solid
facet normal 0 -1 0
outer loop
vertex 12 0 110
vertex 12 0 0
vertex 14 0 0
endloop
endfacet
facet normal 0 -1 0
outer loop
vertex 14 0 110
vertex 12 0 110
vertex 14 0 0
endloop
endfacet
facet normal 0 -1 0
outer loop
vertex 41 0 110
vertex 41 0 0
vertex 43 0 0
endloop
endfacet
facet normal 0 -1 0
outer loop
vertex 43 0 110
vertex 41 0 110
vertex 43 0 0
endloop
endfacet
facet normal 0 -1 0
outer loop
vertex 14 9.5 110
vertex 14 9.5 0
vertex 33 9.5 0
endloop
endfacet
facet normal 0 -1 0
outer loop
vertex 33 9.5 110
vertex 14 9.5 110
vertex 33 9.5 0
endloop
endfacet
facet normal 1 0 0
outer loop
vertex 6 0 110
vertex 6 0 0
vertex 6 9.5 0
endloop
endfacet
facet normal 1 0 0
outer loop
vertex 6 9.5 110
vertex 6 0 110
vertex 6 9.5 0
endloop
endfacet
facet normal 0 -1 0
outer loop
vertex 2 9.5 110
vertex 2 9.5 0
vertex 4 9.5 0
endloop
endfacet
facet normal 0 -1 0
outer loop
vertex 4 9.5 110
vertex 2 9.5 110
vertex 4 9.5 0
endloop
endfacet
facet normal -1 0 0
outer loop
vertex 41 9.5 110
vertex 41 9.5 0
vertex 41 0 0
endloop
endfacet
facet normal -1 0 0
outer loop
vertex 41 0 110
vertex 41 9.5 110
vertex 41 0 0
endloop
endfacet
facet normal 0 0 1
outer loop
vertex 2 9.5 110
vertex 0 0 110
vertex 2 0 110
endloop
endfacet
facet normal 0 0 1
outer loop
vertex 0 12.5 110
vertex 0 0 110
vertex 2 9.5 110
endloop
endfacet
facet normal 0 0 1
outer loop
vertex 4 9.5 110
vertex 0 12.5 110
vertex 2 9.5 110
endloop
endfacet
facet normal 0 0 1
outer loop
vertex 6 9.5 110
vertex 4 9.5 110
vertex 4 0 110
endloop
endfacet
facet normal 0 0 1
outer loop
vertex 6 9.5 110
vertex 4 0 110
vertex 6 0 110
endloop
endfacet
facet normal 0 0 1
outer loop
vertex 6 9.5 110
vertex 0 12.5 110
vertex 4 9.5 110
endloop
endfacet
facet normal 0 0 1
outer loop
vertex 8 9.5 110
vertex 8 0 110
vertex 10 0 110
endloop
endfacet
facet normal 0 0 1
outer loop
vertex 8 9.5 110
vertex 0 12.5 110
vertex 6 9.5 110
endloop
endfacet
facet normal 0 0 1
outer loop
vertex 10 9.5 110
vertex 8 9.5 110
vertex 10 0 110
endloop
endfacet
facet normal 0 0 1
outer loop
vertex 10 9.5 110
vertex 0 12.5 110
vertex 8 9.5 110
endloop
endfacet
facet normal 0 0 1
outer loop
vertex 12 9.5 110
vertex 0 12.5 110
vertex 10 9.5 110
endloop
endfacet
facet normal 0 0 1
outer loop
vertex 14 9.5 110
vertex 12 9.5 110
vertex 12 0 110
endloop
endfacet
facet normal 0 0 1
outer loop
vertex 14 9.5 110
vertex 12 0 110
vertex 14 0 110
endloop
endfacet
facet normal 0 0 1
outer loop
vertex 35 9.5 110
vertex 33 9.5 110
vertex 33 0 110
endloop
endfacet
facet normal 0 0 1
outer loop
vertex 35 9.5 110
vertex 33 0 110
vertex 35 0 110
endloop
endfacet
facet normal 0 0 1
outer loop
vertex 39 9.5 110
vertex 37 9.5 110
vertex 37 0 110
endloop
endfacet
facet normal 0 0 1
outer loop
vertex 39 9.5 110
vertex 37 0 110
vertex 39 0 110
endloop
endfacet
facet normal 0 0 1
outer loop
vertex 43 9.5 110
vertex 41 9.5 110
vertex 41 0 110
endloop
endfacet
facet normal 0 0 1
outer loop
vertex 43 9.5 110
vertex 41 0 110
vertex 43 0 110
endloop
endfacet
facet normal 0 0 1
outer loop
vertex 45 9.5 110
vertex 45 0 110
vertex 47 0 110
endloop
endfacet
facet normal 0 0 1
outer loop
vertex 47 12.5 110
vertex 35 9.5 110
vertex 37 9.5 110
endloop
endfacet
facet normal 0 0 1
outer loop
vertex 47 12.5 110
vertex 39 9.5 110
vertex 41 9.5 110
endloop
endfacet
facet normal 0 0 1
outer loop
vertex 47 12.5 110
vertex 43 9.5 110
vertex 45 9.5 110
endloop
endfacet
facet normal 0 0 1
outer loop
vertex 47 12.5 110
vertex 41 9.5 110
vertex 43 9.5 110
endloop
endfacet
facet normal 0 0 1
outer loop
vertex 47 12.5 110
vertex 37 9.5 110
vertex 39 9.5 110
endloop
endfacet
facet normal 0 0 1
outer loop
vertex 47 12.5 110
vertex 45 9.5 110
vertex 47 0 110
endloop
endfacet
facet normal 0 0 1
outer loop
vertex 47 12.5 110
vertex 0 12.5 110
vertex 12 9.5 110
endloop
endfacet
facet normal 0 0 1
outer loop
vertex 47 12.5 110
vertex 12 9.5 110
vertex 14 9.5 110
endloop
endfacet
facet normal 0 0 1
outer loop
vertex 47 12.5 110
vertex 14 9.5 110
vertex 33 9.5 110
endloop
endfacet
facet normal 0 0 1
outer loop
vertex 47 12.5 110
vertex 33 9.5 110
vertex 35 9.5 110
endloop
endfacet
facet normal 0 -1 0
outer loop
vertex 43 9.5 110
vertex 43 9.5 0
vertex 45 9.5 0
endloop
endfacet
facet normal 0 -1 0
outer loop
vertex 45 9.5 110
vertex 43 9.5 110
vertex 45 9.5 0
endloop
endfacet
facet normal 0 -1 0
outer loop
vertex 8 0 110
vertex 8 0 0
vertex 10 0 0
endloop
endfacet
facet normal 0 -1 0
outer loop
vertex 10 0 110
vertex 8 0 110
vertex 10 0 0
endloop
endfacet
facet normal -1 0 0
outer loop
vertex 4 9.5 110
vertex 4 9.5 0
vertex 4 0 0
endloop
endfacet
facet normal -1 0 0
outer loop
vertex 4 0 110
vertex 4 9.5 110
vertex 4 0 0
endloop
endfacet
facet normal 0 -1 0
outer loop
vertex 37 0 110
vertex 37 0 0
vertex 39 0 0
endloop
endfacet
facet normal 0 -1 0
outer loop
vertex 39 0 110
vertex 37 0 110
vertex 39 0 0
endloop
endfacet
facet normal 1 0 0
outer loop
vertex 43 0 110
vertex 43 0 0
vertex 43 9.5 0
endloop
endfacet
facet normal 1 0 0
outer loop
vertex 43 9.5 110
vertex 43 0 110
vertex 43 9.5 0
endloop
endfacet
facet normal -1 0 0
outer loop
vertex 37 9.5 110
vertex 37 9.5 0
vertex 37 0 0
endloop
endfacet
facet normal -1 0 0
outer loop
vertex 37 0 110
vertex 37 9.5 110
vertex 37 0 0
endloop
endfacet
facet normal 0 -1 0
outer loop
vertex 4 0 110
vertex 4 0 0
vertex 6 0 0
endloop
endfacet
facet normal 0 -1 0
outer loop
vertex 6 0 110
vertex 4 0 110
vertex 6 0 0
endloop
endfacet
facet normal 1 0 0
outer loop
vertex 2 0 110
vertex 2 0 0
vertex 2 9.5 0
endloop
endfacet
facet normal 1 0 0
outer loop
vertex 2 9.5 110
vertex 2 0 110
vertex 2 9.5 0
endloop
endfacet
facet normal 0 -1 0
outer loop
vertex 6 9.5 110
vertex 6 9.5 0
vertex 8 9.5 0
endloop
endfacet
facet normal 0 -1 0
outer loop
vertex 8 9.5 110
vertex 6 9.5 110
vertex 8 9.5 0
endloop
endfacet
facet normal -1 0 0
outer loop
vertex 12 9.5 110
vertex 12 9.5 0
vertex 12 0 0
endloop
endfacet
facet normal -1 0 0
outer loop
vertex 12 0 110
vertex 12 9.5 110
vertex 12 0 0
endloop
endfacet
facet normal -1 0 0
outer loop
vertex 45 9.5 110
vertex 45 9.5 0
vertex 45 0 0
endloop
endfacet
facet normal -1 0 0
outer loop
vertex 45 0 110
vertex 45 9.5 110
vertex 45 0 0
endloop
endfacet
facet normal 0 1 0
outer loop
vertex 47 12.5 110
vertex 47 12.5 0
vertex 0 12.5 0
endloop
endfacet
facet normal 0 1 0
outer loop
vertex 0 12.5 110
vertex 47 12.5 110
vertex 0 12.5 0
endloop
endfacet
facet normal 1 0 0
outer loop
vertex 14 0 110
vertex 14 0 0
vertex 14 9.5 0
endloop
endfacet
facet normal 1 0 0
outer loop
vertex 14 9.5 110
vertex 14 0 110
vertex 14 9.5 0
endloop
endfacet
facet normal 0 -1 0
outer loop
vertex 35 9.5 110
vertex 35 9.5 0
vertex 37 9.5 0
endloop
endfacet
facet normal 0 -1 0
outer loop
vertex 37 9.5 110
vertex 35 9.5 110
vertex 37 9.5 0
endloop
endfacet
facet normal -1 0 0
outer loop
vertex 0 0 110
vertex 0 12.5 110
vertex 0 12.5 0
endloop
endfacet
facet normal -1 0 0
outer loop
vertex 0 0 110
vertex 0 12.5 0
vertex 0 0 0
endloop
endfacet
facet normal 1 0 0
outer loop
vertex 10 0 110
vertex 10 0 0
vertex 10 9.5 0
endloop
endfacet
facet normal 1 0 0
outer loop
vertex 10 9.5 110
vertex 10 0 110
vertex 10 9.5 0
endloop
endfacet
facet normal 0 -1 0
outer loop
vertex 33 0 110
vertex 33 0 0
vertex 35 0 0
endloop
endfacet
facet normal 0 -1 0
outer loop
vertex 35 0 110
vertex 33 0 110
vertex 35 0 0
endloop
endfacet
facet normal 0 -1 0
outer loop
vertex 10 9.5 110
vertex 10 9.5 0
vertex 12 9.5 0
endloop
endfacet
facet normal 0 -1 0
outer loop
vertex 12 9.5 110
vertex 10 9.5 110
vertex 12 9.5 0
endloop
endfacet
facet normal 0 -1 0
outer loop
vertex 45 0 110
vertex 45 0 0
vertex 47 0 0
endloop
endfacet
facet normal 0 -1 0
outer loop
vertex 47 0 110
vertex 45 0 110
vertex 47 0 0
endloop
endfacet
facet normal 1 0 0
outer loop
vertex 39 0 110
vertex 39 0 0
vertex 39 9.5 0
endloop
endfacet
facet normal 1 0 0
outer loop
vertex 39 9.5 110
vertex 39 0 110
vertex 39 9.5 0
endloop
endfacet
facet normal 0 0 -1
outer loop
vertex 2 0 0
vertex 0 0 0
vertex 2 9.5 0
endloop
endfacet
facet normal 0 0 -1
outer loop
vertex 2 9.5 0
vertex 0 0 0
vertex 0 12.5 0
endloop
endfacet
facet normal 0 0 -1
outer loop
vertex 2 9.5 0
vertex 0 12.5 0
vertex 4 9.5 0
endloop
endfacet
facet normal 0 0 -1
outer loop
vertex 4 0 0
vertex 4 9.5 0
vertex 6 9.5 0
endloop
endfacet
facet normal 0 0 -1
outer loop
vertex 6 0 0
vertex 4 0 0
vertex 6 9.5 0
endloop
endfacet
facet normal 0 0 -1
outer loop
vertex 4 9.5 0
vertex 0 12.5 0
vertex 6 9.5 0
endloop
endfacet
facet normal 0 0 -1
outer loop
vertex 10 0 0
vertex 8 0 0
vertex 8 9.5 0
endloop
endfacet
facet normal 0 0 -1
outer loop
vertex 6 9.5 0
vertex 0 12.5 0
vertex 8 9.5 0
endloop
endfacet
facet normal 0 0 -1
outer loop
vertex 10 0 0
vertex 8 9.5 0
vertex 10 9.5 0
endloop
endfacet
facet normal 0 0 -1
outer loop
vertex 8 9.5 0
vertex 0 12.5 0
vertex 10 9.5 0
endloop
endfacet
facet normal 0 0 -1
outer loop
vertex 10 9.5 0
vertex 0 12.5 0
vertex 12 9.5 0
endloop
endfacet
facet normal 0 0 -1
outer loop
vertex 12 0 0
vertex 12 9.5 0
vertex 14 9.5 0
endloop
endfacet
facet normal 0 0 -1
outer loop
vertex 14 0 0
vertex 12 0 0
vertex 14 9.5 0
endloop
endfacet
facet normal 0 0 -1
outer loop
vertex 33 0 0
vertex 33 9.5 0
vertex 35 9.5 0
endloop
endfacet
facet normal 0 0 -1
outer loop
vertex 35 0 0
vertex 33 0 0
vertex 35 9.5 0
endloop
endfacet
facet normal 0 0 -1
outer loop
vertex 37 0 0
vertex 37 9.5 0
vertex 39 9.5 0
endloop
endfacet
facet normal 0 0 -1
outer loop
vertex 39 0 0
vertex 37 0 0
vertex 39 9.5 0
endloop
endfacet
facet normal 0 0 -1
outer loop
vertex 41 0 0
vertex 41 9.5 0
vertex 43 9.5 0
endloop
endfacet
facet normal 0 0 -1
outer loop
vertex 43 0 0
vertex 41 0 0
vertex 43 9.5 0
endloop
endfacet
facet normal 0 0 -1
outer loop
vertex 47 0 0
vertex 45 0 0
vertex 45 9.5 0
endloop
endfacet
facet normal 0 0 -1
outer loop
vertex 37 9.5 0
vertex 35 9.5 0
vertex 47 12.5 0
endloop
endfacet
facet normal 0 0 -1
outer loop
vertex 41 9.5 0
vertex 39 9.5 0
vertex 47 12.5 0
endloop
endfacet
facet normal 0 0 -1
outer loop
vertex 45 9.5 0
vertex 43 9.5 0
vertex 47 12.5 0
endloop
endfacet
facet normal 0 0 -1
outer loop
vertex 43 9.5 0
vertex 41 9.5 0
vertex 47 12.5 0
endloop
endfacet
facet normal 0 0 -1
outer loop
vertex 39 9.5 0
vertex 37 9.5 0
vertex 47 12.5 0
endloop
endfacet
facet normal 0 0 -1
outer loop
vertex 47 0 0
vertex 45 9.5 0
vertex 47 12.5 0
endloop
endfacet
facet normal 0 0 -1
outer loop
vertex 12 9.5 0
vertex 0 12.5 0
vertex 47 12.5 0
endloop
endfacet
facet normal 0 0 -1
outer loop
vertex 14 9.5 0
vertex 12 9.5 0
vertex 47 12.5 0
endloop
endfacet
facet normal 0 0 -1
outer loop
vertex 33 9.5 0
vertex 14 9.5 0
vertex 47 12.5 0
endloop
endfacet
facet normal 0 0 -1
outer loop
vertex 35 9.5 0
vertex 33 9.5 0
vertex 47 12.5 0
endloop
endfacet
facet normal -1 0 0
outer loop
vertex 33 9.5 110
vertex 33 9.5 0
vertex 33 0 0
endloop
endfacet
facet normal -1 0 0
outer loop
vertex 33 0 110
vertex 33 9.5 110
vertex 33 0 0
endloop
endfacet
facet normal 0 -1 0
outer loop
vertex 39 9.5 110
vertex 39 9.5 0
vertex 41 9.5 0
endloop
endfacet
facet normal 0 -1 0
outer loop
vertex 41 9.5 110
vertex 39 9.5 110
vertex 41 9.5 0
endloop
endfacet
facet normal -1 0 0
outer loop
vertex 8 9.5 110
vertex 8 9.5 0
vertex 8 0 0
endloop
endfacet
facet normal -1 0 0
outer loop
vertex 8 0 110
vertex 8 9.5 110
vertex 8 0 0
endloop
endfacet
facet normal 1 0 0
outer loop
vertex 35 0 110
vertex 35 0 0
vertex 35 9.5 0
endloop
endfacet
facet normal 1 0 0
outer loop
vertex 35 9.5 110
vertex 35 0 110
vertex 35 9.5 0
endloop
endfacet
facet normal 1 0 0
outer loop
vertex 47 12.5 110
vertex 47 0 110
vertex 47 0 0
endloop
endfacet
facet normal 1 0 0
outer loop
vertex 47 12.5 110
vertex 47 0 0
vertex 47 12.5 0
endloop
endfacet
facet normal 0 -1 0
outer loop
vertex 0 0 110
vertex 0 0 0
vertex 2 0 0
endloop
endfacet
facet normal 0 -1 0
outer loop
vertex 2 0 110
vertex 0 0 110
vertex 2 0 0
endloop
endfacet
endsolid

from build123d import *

# Parameters (mm, degrees)
BOSS_EXTRUDE1_DEPTH = 110


with BuildPart() as part:
    # Sketch1 → Boss-Extrude1 (new body)
    with BuildSketch(Plane.XY):
        Polygon((0, 12.5), (0, 0), (2, 0), (2, 9.5), (4, 9.5), (4, 0), (6, 0), (6, 9.5), (8, 9.5), (8, 0), (10, 0), (10, 9.5), (12, 9.5), (12, 0), (14, 0), (14, 9.5), (23.5, 9.5), (23.5, 12.5), align=None)
        Polygon((47, 12.5), (23.5, 12.5), (23.5, 9.5), (33, 9.5), (33, 0), (35, 0), (35, 9.5), (37, 9.5), (37, 0), (39, 0), (39, 9.5), (41, 9.5), (41, 0), (43, 0), (43, 9.5), (45, 9.5), (45, 0), (47, 0), align=None)
    extrude(amount=BOSS_EXTRUDE1_DEPTH)


solid = part.part
